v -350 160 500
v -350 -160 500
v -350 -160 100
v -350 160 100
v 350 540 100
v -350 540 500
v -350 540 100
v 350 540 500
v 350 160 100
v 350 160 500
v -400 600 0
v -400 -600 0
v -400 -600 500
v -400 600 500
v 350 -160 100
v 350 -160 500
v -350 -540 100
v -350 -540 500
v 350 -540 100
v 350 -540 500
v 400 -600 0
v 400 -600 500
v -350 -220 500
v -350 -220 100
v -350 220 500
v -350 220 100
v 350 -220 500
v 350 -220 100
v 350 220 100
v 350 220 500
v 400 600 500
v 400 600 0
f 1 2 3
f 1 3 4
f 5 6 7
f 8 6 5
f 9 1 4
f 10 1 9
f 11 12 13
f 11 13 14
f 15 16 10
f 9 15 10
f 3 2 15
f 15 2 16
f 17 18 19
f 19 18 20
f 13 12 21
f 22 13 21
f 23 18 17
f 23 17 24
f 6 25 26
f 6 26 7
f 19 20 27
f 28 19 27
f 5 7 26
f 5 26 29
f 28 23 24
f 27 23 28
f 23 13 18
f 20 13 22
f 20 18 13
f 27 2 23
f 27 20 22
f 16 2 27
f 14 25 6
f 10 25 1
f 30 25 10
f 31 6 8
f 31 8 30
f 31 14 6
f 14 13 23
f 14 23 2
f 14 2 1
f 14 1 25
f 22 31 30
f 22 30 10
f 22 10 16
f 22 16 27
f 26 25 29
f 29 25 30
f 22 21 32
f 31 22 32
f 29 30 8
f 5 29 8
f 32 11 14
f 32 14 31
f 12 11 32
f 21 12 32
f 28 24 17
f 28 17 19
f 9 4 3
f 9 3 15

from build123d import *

# Parameters (mm, degrees)
SKETCH1_W           = 800
SKETCH1_H           = 1200
BOSS_EXTRUDE1_DEPTH = 500
SKETCH2_W           = 700
SKETCH2_H           = 320
CUT_EXTRUDE1_DEPTH  = 400


with BuildPart() as part:
    # Sketch1 → Boss-Extrude1 (new body)
    with BuildSketch(Plane.XY):
        Rectangle(SKETCH1_W, SKETCH1_H)
    extrude(amount=BOSS_EXTRUDE1_DEPTH)

    # Sketch2 → Cut-Extrude1 (cut)
    with BuildSketch(Plane.XY.offset(500)):
        with Locations((0, 380)):
            Rectangle(SKETCH2_W, SKETCH2_H)
        Rectangle(SKETCH2_W, SKETCH2_H)
        with Locations((0, -380)):
            Rectangle(SKETCH2_W, SKETCH2_H)
    extrude(amount=-CUT_EXTRUDE1_DEPTH, mode=Mode.SUBTRACT)


solid = part.part
